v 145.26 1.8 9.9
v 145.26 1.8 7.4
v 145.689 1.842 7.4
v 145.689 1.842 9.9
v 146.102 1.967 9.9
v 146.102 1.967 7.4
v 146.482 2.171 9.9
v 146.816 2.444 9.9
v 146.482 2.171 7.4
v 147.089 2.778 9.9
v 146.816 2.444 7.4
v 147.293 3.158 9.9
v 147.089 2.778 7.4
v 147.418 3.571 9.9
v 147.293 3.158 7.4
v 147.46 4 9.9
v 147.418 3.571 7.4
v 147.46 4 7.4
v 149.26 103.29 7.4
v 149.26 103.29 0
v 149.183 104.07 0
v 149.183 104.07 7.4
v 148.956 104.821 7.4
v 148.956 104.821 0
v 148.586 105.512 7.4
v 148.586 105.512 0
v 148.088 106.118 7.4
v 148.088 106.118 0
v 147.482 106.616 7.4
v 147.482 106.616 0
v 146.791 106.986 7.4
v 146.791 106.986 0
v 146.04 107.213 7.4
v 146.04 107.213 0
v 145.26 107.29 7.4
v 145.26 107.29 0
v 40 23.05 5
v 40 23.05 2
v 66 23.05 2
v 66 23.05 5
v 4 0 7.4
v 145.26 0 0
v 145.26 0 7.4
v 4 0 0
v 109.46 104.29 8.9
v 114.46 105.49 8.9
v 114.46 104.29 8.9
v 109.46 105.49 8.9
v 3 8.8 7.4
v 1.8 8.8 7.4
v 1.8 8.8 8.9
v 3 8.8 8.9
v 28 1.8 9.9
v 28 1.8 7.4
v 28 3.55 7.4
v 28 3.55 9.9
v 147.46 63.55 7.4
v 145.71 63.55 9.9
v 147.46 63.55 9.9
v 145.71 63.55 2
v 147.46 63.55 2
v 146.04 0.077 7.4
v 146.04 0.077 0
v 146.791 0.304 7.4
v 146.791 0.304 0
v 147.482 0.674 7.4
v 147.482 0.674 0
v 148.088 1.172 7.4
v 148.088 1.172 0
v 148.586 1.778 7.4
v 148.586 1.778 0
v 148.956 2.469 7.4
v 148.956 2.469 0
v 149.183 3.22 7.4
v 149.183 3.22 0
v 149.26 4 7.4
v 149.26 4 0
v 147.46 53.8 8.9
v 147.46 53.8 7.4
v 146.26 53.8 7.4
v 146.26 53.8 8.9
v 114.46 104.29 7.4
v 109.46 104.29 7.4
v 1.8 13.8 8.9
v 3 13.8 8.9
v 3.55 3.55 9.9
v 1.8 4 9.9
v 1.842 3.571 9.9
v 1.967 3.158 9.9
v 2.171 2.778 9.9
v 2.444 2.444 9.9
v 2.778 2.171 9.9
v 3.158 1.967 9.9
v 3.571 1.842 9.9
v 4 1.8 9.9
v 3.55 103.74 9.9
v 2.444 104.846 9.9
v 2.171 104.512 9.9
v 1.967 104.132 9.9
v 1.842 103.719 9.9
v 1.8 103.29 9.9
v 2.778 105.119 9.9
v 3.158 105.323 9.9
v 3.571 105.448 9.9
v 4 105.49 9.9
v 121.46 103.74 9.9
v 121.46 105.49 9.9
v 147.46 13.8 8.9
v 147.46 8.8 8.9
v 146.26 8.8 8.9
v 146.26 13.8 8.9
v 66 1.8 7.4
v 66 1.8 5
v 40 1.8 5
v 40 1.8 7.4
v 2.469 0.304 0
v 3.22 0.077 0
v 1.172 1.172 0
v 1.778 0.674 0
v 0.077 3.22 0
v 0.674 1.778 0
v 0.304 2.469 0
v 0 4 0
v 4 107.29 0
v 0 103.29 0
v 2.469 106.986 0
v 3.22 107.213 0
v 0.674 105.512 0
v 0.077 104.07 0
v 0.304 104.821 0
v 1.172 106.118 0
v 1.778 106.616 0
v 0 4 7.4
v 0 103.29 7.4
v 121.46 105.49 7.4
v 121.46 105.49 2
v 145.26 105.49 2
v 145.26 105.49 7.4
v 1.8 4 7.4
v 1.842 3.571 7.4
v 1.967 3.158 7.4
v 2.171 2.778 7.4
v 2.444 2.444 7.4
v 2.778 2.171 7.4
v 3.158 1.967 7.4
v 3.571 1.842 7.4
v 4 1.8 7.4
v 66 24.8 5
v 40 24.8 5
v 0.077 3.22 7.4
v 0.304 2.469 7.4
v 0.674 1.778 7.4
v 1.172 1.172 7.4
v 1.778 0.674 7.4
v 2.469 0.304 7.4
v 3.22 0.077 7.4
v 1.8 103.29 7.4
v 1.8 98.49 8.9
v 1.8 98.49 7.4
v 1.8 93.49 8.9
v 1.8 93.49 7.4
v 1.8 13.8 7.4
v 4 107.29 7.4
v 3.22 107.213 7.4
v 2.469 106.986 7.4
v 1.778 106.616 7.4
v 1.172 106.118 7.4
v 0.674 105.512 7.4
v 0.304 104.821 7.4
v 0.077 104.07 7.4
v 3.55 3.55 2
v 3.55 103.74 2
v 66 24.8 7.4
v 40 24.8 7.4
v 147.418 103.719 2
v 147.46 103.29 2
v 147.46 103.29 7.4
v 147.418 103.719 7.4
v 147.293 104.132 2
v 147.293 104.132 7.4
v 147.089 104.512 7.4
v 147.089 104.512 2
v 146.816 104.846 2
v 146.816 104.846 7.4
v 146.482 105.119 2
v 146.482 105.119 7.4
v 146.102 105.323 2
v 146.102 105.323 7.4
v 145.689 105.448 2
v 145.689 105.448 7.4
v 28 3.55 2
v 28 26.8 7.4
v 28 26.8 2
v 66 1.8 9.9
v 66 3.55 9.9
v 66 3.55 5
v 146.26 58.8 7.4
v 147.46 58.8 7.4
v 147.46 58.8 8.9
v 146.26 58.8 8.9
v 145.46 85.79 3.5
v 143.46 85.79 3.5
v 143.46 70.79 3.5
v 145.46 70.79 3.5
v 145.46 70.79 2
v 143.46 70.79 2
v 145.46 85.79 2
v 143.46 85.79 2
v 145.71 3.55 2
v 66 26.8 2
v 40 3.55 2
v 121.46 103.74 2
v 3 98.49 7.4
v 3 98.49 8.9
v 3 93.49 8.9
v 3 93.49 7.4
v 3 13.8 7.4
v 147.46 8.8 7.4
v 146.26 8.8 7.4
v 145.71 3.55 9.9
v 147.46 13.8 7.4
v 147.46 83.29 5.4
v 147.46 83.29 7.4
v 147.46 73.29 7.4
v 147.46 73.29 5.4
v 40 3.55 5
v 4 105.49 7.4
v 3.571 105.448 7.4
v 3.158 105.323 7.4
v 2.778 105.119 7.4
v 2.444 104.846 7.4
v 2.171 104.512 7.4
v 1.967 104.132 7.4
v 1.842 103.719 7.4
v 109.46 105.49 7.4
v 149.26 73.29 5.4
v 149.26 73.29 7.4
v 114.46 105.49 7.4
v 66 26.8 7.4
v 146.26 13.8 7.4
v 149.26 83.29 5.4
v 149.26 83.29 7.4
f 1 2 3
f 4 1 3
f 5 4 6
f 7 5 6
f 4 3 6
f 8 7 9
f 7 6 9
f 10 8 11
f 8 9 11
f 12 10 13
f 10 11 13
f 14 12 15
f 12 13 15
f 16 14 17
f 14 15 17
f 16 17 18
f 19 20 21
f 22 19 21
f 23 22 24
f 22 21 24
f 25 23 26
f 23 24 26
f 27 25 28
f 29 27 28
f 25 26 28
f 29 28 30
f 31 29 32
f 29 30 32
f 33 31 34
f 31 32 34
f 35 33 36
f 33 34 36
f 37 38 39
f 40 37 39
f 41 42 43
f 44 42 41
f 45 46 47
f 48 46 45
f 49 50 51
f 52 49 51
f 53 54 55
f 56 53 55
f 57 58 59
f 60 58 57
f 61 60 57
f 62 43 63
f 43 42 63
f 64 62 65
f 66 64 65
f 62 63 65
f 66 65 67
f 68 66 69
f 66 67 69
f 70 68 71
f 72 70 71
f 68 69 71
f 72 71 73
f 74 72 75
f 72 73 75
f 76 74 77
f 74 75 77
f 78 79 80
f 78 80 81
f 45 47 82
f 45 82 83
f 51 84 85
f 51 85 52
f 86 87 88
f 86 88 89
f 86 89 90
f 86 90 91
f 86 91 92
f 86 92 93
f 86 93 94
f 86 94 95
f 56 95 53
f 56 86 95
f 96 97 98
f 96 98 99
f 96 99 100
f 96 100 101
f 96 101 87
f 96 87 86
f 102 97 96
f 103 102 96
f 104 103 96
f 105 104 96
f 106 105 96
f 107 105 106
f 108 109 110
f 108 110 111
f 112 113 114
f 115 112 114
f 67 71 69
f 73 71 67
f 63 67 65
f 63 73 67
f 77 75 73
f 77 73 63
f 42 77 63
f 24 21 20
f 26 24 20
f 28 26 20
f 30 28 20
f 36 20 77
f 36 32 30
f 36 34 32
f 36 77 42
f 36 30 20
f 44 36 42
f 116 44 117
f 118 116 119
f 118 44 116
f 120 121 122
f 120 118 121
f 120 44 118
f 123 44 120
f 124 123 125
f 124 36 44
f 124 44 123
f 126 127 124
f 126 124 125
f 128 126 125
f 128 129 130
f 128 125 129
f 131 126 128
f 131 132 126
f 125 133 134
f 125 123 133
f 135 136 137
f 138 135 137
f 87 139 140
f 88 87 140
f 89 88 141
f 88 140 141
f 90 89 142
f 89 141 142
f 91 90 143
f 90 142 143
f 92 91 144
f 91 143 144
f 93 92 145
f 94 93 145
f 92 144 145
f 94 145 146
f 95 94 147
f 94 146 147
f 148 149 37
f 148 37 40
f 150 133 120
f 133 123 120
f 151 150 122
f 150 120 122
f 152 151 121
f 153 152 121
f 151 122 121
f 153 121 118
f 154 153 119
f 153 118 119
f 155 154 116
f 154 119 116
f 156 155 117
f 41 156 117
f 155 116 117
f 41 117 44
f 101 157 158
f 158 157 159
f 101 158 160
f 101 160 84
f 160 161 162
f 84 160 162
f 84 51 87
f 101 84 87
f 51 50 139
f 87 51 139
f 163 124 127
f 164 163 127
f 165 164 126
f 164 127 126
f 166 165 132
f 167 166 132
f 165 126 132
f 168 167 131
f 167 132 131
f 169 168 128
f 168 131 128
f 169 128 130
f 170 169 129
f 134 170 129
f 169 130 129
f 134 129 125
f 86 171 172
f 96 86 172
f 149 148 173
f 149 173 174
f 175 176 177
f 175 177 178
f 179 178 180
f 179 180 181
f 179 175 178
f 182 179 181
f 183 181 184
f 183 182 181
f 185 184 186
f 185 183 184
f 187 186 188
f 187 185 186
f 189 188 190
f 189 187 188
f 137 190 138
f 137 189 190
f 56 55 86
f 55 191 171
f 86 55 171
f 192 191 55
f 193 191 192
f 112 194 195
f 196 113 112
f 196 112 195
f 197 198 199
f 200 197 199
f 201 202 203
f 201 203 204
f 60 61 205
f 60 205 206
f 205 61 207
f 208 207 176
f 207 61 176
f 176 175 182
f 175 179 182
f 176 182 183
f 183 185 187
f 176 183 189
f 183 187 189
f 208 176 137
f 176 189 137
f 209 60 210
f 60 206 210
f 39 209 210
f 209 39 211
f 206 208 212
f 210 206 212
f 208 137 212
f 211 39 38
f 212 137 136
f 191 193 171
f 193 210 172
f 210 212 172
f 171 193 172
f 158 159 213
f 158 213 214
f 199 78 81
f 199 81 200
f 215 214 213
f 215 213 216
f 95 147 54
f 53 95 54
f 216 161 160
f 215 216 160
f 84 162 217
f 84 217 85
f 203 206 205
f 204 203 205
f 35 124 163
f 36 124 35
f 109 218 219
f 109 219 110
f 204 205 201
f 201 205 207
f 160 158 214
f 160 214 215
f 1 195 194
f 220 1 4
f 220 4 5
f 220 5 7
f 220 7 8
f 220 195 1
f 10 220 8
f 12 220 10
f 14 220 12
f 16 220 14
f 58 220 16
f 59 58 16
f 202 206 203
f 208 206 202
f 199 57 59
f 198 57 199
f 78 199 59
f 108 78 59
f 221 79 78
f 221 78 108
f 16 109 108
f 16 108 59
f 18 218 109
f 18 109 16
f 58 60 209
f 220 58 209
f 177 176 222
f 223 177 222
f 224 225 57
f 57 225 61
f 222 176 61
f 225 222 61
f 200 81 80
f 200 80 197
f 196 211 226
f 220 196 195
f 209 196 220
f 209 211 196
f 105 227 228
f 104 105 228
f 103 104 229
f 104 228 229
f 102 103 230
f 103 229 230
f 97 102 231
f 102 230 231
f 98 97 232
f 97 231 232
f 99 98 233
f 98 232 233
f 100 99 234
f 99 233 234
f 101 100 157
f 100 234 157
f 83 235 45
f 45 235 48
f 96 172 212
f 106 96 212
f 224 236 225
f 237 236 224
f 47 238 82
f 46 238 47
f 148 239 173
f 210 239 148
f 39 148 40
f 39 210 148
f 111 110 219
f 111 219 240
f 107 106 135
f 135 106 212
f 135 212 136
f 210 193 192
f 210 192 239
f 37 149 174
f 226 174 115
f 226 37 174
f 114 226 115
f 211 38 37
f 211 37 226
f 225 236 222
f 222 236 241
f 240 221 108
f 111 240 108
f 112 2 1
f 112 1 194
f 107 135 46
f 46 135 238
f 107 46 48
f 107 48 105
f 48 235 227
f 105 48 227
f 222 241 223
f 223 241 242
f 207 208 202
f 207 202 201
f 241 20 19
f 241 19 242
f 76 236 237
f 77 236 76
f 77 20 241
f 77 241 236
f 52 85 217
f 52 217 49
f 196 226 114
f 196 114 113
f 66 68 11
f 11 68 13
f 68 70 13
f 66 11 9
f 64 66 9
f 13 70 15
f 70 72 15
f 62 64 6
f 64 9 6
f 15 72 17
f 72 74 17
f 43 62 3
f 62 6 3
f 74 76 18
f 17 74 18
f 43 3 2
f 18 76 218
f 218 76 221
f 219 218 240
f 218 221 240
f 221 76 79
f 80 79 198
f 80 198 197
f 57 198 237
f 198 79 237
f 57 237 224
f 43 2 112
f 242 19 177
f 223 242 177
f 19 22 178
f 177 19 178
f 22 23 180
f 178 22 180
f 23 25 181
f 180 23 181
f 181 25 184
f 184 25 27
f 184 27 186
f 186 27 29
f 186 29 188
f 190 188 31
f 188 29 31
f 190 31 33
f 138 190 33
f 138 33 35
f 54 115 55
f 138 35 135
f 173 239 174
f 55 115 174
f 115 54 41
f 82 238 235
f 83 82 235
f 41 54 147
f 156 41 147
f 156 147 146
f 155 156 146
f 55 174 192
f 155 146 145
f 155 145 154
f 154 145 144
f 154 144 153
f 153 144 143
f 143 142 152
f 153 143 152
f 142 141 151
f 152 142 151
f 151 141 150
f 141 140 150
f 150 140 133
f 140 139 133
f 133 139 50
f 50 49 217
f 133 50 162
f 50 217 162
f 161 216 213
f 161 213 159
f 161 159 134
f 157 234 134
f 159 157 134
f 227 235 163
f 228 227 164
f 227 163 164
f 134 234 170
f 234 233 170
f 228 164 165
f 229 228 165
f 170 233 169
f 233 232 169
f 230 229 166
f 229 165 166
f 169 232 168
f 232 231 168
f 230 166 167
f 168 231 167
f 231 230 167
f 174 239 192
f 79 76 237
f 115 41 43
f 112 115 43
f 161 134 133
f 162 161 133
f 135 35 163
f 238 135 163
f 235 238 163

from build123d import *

# Parameters (mm, degrees)
PAD_DEPTH       = 2
PAD001_DEPTH    = 5.4
SKETCH002_W     = 26
SKETCH002_H     = 3.75
SKETCH002_H_2   = 1.75
SKETCH002_W_2   = 12
SKETCH002_H_3   = 25
PAD002_DEPTH    = 3
PAD003_DEPTH    = 2.4
PAD005_DEPTH    = 7.9
SKETCH007_W     = 5
SKETCH007_H     = 1.5
POCKET001_DEPTH = 1.2
SKETCH008_W     = 5
SKETCH008_H     = 1.5
POCKET002_DEPTH = 1.2
SKETCH009_W     = 10
SKETCH009_H     = 2
POCKET003_DEPTH = 1.8
SKETCH020_W     = 5
SKETCH020_H     = 1.5
POCKET009_DEPTH = 1.2
SKETCH021_W     = 2
SKETCH021_H     = 15
PAD010_DEPTH    = 1.5


with BuildPart() as part:
    # Sketch → Pad (new body)
    with BuildSketch(Plane.XY):
        with BuildLine():
            Line((149.26, 103.29), (149.26, 4))
            ThreePointArc((145.26, 0), (148.088427, 1.171573), (149.26, 4))
            Line((4, 0), (145.26, 0))
            ThreePointArc((0, 4), (1.171573, 1.171573), (4, 0))
            Line((0, 103.29), (0, 4))
            ThreePointArc((4, 107.29), (1.171573, 106.118427), (0, 103.29))
            Line((4, 107.29), (145.26, 107.29))
            ThreePointArc((149.26, 103.29), (148.088427, 106.118427), (145.26, 107.29))
        make_face()
    extrude(amount=PAD_DEPTH)

    # Sketch001 (on Face10 of Pad) → Pad001 (join)
    with BuildSketch(Plane.XY.offset(2)):
        with BuildLine():
            ThreePointArc((4, 107.29), (1.171573, 106.118427), (0, 103.29))
            Line((0, 4), (0, 103.29))
            ThreePointArc((0, 4), (1.171573, 1.171573), (4, 0))
            Line((145.26, 0), (4, 0))
            ThreePointArc((145.26, 0), (148.088427, 1.171573), (149.26, 4))
            Line((149.26, 103.29), (149.26, 4))
            ThreePointArc((149.26, 103.29), (148.088427, 106.118427), (145.26, 107.29))
            Line((4, 107.29), (145.26, 107.29))
        make_face()
        with BuildLine():
            Line((4, 105.49), (145.26, 105.49))
            ThreePointArc((147.46, 103.289998), (146.815636, 104.845634), (145.26, 105.49))
            Line((147.46, 103.289998), (147.46, 3.999998))
            ThreePointArc((145.259998, 1.8), (146.815633, 2.444364), (147.46, 3.999998))
            Line((145.259998, 1.8), (3.999998, 1.8))
            ThreePointArc((1.8, 4), (2.444364, 2.444366), (3.999998, 1.8))
            Line((1.8, 4), (1.8, 103.29))
            ThreePointArc((4, 105.49), (2.444365, 104.845635), (1.8, 103.29))
        make_face(mode=Mode.SUBTRACT)
    extrude(amount=PAD001_DEPTH)

    # Sketch002 (on Face10 of Pad001) → Pad002 (join)
    with BuildSketch(Plane.XY.offset(2)):
        with Locations((53, 24.925)):
            Rectangle(SKETCH002_W, SKETCH002_H)
        with Locations((53, 2.675)):
            Rectangle(SKETCH002_W, SKETCH002_H_2)
        with Locations((34, 14.3)):
            Rectangle(SKETCH002_W_2, SKETCH002_H_3)
    extrude(amount=PAD002_DEPTH)

    # Sketch003 (on Face21 of Pad002) → Pad003 (join)
    with BuildSketch(Plane.XY.offset(5)):
        Polygon((28, 1.8), (28, 26.8), (66, 26.8), (66, 24.8), (40, 24.8), (40, 1.8), align=None)
    extrude(amount=PAD003_DEPTH)

    # Sketch006 (on Face22 of Pad003) → Pad005 (join)
    with BuildSketch(Plane.XY.offset(2)):
        with BuildLine():
            ThreePointArc((1.8, 4), (2.444364, 2.444366), (3.999998, 1.8))
            Line((3.999998, 1.8), (28, 1.8))
            Line((28, 1.8), (28, 3.55))
            Line((28, 3.55), (3.55, 3.55))
            Line((3.55, 3.55), (3.55, 103.74))
            Line((3.55, 103.74), (121.46, 103.74))
            Line((121.46, 103.74), (121.46, 105.49))
            Line((121.46, 105.49), (3.999988, 105.49))
            ThreePointArc((3.999988, 105.49), (2.444361, 104.845631), (1.8, 103.29))
            Line((1.8, 103.29), (1.8, 4))
        make_face()
        with BuildLine():
            ThreePointArc((145.259998, 1.8), (146.815633, 2.444364), (147.46, 3.999997))
            Line((147.46, 63.55), (147.46, 3.999997))
            Line((145.71, 63.55), (147.46, 63.55))
            Line((145.71, 63.55), (145.71, 3.55))
            Line((66, 3.55), (145.71, 3.55))
            Line((66, 1.8), (66, 3.55))
            Line((145.259998, 1.8), (66, 1.8))
        make_face()
    extrude(amount=PAD005_DEPTH)

    # Sketch007 (on Face11 of Pad005) → Pocket001 (cut)
    with BuildSketch(Plane(origin=(1.8, 0, 0), x_dir=(0, -1, 0), z_dir=(-1, 0, 0))):
        with Locations((-95.99, 8.15)):
            Rectangle(SKETCH007_W, SKETCH007_H)
        with Locations((-11.3, 8.15)):
            Rectangle(SKETCH007_W, SKETCH007_H)
    extrude(amount=-POCKET001_DEPTH, mode=Mode.SUBTRACT)

    # Sketch008 (on Face38 of Pocket001) → Pocket002 (cut)
    with BuildSketch(Plane.YZ.offset(147.46)):
        with Locations((11.3, 8.15)):
            Rectangle(SKETCH008_W, SKETCH008_H)
        with Locations((56.3, 8.15)):
            Rectangle(SKETCH008_W, SKETCH008_H)
    extrude(amount=-POCKET002_DEPTH, mode=Mode.SUBTRACT)

    # Sketch009 (on Face4 of Pocket002) → Pocket003 (cut)
    with BuildSketch(Plane.YZ.offset(149.26)):
        with Locations((78.29, 6.4)):
            Rectangle(SKETCH009_W, SKETCH009_H)
    extrude(amount=-POCKET003_DEPTH, mode=Mode.SUBTRACT)

    # Sketch020 (on Face17 of Pocket003) → Pocket009 (cut)
    with BuildSketch(Plane(origin=(0, 105.49, 0), x_dir=(-1, 0, 0), z_dir=(0, 1, 0))):
        with Locations((-111.96, 8.15)):
            Rectangle(SKETCH020_W, SKETCH020_H)
    extrude(amount=-POCKET009_DEPTH, mode=Mode.SUBTRACT)

    # Sketch021 (on Face16 of Pocket009) → Pad010 (join)
    with BuildSketch(Plane.XY.offset(2)):
        with Locations((144.46, 78.29)):
            Rectangle(SKETCH021_W, SKETCH021_H)
    extrude(amount=PAD010_DEPTH)


solid = part.part
